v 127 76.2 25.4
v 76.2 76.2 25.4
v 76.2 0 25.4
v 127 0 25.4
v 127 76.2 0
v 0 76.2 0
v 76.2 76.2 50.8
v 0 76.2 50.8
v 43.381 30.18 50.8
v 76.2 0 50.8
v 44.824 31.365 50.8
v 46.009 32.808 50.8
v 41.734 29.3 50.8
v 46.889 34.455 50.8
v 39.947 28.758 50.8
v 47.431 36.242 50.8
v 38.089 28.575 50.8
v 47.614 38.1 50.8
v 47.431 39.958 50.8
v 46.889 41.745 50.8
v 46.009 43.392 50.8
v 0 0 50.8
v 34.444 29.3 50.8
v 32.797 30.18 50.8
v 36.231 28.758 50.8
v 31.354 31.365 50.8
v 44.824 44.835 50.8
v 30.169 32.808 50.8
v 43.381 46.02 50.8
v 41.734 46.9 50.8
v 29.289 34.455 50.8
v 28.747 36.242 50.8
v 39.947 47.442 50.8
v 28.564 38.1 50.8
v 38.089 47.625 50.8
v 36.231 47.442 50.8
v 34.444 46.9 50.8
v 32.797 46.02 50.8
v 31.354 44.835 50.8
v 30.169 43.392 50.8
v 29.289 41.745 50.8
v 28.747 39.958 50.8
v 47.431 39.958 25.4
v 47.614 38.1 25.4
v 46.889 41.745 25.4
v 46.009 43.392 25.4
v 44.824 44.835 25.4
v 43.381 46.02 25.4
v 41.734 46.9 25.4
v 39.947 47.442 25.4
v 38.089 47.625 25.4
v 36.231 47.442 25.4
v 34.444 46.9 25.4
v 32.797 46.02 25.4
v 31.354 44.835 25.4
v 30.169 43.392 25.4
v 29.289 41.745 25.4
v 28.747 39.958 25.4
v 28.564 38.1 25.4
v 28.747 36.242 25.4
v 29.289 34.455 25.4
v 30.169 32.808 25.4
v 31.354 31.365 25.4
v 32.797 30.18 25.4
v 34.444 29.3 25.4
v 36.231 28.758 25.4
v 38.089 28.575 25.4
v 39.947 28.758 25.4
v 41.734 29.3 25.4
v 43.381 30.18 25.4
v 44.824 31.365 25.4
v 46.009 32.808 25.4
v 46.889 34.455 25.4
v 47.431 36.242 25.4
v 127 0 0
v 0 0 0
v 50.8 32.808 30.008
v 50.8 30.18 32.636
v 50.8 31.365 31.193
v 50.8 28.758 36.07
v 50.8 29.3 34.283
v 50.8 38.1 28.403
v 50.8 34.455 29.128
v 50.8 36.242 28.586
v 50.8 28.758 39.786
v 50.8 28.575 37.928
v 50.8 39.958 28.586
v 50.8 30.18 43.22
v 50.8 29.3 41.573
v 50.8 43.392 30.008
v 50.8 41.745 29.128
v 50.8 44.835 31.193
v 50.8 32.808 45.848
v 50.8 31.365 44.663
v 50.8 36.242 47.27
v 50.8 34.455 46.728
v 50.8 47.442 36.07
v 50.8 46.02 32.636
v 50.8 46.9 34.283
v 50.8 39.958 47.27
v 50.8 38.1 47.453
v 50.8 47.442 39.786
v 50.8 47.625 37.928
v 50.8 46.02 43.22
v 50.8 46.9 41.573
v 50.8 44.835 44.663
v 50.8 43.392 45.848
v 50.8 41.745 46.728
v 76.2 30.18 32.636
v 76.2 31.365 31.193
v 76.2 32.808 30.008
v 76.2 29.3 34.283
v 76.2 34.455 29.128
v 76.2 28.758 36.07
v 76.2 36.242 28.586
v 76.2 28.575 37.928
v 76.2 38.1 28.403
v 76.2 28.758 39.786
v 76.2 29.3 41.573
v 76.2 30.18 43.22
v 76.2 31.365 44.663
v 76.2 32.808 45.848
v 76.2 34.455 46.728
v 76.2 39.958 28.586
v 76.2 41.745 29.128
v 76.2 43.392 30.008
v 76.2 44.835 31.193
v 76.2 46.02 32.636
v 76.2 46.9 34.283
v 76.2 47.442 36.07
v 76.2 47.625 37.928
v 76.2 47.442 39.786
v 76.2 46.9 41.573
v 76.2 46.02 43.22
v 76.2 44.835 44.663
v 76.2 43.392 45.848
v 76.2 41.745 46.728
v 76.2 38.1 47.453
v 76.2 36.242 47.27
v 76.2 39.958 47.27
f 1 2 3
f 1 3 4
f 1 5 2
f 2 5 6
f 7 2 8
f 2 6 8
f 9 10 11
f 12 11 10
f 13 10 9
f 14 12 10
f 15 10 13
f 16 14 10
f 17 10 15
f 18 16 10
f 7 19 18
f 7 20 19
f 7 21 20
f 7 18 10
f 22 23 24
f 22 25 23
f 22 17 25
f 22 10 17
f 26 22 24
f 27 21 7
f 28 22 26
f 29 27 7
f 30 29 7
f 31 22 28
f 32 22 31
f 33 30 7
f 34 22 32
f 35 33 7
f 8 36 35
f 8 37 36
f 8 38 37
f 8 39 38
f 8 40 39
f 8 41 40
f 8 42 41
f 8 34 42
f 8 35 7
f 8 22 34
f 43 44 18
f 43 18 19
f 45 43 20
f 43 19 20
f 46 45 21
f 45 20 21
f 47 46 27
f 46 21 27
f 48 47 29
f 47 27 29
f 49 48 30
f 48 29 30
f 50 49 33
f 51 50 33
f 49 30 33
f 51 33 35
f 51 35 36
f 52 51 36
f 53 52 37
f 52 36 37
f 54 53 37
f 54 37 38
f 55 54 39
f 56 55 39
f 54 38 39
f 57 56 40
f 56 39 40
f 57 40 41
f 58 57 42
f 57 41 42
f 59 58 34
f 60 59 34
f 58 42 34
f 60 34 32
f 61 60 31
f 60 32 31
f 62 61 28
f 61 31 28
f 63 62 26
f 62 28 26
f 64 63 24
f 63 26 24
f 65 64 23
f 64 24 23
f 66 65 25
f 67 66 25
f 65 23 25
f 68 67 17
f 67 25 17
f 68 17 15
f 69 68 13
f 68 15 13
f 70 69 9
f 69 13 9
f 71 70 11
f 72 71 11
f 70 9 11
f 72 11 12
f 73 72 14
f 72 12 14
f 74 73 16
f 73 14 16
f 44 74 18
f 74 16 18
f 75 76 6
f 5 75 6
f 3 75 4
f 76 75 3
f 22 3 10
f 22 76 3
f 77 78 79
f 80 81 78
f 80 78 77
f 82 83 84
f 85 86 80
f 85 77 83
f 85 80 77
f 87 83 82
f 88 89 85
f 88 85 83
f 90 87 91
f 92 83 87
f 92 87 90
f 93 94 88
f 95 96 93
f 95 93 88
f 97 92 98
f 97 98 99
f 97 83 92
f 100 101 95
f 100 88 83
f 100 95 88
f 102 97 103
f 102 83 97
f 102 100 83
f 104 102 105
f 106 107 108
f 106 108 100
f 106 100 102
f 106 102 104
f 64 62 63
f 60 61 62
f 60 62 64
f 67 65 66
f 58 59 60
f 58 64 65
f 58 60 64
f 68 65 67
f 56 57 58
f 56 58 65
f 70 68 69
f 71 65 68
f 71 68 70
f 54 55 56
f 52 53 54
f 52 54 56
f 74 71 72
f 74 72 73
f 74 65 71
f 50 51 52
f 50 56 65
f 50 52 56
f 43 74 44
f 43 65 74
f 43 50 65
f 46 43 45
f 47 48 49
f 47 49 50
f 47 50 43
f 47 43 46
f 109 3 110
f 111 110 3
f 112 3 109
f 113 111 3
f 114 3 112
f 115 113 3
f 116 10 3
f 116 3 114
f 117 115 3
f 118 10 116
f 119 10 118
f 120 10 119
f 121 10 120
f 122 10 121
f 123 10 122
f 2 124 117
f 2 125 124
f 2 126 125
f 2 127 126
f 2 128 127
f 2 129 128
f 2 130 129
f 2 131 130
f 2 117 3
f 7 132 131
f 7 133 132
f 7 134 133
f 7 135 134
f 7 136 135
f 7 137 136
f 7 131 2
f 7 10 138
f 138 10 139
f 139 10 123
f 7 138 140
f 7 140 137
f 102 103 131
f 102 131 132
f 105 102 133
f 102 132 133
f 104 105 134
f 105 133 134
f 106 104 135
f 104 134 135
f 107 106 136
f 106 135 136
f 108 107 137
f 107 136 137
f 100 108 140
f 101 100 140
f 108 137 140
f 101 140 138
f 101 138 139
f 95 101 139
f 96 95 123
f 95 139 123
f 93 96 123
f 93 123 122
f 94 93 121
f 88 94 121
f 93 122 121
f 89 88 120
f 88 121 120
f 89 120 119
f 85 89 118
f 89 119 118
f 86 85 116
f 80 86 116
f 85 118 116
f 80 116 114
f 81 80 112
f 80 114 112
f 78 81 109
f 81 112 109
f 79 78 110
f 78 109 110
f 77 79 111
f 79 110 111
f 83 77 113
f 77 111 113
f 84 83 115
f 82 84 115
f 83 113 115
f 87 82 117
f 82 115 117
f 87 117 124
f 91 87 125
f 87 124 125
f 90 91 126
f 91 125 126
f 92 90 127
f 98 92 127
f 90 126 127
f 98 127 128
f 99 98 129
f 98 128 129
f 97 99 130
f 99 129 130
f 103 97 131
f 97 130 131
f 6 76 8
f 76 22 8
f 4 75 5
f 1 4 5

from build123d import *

# Parameters (mm, degrees)
F2_W     = 76.2
F2_H     = 50.8
F3_DEPTH = 76.2
F1_W     = 127
F1_H     = 76.2
F4_DEPTH = 25.4
F5_R     = 9.525
F7_DEPTH = 25.4
F6_R     = 9.525
F9_DEPTH = 25.4


with BuildPart() as f3:
    # F2 (on Right) → F3 (new body)
    with BuildSketch(Plane.YZ):
        with Locations((38.1, 25.4)):
            Rectangle(F2_W, F2_H)
    extrude(amount=F3_DEPTH)

    # F1 (on Top) → F4 (join)
    with BuildSketch(Plane.XY):
        with Locations((63.5, 38.1)):
            Rectangle(F1_W, F1_H)
    extrude(amount=F4_DEPTH)

    # F5 (on face) → F7 (cut)
    with BuildSketch(Plane.XY.offset(50.8)):
        with Locations((38.089141, 38.1)):
            Circle(F5_R)
    extrude(amount=-F7_DEPTH, mode=Mode.SUBTRACT)

    # F6 (on face) → F9 (cut)
    with BuildSketch(Plane.YZ.offset(76.2)):
        with Locations((38.1, 37.928037)):
            Circle(F6_R)
    extrude(amount=-F9_DEPTH, mode=Mode.SUBTRACT)


solid = f3.part
